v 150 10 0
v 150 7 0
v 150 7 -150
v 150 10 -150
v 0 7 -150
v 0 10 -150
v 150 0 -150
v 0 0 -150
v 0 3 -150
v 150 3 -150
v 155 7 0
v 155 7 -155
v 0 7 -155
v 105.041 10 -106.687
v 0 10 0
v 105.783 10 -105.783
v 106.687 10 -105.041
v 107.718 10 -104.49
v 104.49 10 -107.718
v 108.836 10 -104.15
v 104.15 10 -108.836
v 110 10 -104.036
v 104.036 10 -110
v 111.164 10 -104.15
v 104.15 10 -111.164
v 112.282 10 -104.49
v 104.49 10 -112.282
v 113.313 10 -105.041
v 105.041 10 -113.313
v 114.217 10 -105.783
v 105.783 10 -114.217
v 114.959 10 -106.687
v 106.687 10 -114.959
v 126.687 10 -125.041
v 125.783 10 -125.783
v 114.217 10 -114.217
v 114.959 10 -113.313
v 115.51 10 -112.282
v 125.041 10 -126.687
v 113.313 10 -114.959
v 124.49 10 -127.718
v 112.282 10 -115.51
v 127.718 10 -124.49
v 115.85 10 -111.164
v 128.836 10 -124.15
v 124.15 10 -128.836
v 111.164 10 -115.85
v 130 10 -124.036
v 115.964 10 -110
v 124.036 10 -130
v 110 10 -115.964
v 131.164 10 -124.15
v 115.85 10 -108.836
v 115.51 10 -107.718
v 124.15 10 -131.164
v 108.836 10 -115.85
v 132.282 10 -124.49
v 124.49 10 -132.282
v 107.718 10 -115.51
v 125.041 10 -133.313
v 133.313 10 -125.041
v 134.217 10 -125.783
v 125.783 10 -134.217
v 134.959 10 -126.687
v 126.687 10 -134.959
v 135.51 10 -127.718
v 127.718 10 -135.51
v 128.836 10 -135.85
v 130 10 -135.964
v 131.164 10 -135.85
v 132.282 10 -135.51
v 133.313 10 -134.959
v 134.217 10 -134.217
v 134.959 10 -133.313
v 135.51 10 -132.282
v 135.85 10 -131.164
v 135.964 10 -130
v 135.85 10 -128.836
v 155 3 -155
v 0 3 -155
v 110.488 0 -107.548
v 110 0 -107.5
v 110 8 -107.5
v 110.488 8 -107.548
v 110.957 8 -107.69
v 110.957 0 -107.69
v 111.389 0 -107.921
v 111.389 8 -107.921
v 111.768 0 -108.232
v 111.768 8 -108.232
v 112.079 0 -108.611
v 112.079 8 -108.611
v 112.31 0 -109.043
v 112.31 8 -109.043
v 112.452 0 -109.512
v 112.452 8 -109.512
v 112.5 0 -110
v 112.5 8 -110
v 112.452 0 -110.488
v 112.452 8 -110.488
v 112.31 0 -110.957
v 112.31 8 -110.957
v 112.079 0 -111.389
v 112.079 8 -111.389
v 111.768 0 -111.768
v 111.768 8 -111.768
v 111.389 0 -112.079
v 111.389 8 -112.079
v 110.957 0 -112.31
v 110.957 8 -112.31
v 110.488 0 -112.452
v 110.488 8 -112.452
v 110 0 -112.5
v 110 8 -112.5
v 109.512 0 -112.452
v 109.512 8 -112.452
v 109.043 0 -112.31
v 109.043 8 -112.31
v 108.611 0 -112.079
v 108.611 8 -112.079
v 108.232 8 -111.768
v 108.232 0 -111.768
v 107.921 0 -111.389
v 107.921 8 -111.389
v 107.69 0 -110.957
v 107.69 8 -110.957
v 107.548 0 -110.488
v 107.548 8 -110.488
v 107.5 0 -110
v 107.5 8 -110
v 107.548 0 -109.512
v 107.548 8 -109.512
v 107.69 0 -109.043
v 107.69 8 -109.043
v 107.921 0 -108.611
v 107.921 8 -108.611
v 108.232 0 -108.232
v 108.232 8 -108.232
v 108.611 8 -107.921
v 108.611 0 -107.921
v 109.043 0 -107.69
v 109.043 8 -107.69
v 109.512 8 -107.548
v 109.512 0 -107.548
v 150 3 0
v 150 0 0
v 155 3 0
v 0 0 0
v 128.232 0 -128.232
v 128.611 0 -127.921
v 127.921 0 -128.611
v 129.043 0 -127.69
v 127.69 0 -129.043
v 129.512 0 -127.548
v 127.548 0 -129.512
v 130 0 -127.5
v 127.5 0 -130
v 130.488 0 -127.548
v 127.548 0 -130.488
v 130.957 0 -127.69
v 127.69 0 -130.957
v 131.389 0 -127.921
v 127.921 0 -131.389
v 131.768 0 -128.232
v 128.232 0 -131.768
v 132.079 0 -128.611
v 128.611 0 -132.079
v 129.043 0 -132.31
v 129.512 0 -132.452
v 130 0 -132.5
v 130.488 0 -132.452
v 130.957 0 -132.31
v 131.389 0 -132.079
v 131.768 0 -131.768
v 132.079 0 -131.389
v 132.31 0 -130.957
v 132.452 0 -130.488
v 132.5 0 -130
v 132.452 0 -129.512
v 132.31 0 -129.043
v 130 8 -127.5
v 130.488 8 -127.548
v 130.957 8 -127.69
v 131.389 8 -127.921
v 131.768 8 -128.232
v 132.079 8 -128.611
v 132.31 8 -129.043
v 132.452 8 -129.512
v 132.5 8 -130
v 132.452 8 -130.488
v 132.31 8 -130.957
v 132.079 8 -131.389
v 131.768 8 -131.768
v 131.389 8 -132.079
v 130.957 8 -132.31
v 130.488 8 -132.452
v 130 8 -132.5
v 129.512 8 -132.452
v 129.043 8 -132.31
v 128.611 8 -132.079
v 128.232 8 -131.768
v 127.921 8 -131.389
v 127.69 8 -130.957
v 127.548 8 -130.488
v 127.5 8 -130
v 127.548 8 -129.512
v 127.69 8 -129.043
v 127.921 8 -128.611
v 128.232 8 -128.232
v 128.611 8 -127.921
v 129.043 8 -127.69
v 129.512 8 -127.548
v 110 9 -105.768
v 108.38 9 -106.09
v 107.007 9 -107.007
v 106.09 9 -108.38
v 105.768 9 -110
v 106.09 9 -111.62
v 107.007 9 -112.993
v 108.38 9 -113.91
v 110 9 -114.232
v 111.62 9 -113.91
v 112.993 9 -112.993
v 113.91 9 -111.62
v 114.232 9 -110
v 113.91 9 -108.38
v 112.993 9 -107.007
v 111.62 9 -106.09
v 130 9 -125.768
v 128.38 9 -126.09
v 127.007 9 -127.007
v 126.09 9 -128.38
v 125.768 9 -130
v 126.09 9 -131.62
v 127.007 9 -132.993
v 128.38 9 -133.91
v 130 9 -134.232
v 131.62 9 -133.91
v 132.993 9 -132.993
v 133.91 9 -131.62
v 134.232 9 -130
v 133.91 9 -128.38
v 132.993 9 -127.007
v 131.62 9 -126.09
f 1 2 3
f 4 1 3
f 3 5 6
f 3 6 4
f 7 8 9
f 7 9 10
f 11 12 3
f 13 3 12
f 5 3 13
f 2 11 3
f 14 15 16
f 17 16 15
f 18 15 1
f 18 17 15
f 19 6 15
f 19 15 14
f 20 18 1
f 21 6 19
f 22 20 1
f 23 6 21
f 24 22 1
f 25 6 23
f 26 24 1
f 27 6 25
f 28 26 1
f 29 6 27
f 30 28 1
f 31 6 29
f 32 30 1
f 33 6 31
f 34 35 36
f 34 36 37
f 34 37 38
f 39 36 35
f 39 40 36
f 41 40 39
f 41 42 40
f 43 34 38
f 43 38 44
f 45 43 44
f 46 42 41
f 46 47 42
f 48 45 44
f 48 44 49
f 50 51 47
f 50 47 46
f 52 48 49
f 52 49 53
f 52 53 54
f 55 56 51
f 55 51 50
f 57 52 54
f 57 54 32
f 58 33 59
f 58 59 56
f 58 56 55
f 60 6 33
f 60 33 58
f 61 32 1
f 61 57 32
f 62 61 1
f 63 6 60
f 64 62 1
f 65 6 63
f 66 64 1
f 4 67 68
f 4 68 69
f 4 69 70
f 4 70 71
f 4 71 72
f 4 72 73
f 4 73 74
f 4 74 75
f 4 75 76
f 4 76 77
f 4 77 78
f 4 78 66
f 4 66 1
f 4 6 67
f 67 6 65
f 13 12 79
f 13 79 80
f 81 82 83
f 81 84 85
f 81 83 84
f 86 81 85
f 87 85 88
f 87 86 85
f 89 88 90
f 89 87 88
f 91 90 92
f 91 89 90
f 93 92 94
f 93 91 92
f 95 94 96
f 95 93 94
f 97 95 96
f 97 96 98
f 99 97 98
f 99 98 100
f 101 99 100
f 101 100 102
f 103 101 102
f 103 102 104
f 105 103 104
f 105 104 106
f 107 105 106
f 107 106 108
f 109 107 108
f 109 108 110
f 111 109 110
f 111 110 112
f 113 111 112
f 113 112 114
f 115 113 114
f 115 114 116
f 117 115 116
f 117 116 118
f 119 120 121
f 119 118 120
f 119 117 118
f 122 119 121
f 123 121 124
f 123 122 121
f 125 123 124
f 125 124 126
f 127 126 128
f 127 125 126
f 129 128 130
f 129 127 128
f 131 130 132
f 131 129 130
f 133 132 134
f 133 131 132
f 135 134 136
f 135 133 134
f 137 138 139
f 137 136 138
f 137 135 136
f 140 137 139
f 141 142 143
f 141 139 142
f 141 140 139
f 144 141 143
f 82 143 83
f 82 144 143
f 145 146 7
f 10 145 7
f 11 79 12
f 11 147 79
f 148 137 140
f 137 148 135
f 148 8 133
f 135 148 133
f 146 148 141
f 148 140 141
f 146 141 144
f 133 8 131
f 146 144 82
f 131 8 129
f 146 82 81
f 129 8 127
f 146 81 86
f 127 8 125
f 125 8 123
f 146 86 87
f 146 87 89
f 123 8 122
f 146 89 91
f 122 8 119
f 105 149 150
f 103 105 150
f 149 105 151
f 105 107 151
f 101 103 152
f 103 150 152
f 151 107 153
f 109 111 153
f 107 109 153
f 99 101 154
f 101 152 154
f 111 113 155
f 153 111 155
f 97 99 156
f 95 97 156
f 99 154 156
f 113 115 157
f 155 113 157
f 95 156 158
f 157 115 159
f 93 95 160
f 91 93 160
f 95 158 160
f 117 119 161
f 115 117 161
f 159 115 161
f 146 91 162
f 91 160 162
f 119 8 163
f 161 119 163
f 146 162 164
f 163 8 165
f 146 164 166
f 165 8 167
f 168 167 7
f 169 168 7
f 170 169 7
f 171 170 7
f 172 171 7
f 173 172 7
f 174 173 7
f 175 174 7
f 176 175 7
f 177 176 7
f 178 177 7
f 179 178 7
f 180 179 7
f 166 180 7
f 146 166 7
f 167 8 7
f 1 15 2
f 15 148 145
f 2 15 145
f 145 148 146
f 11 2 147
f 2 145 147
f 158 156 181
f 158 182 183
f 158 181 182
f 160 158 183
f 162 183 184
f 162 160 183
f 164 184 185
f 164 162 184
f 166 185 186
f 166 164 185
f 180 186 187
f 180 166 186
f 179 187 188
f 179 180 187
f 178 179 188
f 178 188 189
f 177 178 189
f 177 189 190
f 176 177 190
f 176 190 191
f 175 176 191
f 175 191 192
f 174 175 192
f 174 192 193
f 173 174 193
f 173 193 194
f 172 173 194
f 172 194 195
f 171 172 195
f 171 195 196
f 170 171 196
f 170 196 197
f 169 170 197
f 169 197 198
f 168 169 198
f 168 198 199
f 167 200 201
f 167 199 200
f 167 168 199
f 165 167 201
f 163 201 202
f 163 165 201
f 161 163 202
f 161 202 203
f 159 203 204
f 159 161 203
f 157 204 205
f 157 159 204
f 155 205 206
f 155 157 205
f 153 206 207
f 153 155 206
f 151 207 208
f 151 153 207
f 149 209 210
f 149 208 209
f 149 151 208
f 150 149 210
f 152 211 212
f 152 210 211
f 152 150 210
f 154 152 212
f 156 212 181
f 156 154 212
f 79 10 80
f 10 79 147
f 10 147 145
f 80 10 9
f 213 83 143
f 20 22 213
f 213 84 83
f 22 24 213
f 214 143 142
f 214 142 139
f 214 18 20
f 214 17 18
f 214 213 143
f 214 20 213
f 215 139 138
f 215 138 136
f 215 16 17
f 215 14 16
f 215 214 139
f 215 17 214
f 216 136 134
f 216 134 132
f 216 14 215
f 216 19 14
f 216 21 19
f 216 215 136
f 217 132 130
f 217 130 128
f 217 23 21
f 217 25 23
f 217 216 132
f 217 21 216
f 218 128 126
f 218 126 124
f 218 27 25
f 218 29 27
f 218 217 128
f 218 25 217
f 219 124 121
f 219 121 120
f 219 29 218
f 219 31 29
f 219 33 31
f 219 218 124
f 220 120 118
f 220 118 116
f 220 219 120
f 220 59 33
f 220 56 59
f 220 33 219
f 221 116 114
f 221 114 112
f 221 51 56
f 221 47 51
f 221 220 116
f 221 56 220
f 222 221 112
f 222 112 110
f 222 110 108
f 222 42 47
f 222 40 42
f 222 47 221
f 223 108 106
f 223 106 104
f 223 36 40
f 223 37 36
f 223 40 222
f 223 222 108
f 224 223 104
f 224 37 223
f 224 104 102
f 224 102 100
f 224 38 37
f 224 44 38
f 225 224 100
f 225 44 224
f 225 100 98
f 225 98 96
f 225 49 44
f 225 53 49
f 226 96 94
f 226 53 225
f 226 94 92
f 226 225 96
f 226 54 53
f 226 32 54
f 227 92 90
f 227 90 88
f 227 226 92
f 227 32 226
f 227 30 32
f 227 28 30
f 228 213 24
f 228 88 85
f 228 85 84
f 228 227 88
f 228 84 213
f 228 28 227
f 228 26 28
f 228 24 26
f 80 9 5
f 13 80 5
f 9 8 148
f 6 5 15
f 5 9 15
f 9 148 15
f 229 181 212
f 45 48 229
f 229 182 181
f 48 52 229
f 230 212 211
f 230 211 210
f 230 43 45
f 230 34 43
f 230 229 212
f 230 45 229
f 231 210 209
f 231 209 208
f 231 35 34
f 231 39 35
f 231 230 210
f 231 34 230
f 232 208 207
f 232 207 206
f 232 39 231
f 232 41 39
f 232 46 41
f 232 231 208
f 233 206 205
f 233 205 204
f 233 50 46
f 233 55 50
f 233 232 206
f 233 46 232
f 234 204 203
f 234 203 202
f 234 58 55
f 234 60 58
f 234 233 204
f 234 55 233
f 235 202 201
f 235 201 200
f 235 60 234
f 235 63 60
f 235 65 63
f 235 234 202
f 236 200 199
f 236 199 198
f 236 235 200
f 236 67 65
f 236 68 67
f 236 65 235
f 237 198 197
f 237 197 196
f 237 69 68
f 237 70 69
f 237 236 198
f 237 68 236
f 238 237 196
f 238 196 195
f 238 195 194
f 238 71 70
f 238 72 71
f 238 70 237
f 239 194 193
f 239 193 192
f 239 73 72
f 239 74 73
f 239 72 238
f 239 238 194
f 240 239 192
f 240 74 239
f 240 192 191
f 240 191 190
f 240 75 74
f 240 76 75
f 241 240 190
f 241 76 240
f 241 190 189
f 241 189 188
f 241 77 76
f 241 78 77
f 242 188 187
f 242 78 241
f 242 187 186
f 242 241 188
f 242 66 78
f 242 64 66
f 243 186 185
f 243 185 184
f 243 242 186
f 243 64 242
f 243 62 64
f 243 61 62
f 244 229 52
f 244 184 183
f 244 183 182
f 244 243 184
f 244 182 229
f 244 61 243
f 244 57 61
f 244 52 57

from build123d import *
from OCP.BRepFilletAPI import BRepFilletAPI_MakeChamfer

# Parameters (mm, degrees)
SKETCH1_W               = 150
SKETCH1_H               = 150
BOSS_EXTRUDE1_DEPTH     = 10
SKETCH2_W               = 150
SKETCH2_H               = 4
BOSS_EXTRUDE2_DEPTH     = 5
SKETCH3_W               = 155
SKETCH3_H               = 4
BOSS_EXTRUDE3_DEPTH     = 5
CUT_EXTRUDE1_DEPTH      = 220.431082575
CUT_EXTRUDE1_DEPTH_BACK = 220.431082575
SKETCH4_R               = 2.5
CHAMFER1_SIZE           = 2
CHAMFER1_SIZE2          = 3.464101615


with BuildPart() as part:
    # Sketch1 → Boss-Extrude1 (new body)
    with BuildSketch(Plane(origin=(0, 0, 0), x_dir=(1, 0, 0), z_dir=(0, 1, 0))):
        with Locations((75, 75)):
            Rectangle(SKETCH1_W, SKETCH1_H)
    extrude(amount=BOSS_EXTRUDE1_DEPTH)

    # Sketch2 → Boss-Extrude2 (add)
    with BuildSketch(Plane(origin=(150, 0, 0), x_dir=(0, 0, -1), z_dir=(1, 0, 0))):
        with Locations((75, 5)):
            Rectangle(SKETCH2_W, SKETCH2_H)
    extrude(amount=BOSS_EXTRUDE2_DEPTH)

    # Sketch3 → Boss-Extrude3 (add)
    with BuildSketch(Plane(origin=(0, 0, -150), x_dir=(-1, 0, 0), z_dir=(0, 0, -1))):
        with Locations((-77.5, 5)):
            Rectangle(SKETCH3_W, SKETCH3_H)
    extrude(amount=BOSS_EXTRUDE3_DEPTH)

    # Sketch4 → Cut-Extrude1 (cut, two sides: drawn at the far end of the back side and taken through both)
    with BuildSketch(Plane(origin=(0, 10, 0), x_dir=(1, 0, 0), z_dir=(0, 1, 0)).offset(-CUT_EXTRUDE1_DEPTH_BACK)):
        with Locations(Location((130, 130, 0), (0, 0, 270))):
            Circle(SKETCH4_R)
        with Locations(Location((110, 110, 0), (0, 0, 270))):
            Circle(SKETCH4_R)
    extrude(amount=CUT_EXTRUDE1_DEPTH + CUT_EXTRUDE1_DEPTH_BACK, mode=Mode.SUBTRACT)

    # Chamfer1: one chamfer whose edges measure the first distance from different faces: ONE call of the kernel's chamfer builder (chamfer() names one face for all edges)
    chamfer1_edges_1 = [part.edges().sort_by_distance(p)[0] for p in [
        (130, 10, -132.5),
    ]]
    chamfer1_side_1 = [part.faces().sort_by_distance(p)[0] for p in [
        (130, 5, -132.5),
    ]]
    chamfer1_edges_2 = [part.edges().sort_by_distance(p)[0] for p in [
        (110, 10, -112.5),
    ]]
    chamfer1_side_2 = [part.faces().sort_by_distance(p)[0] for p in [
        (110, 5, -112.5),
    ]]
    chamfer1 = BRepFilletAPI_MakeChamfer(part.part.solid().wrapped)
    for e in chamfer1_edges_1:
        chamfer1.Add(CHAMFER1_SIZE, CHAMFER1_SIZE2, e.wrapped, chamfer1_side_1[0].wrapped)  # the first distance lies on this face
    for e in chamfer1_edges_2:
        chamfer1.Add(CHAMFER1_SIZE, CHAMFER1_SIZE2, e.wrapped, chamfer1_side_2[0].wrapped)  # the first distance lies on this face
    add(Compound.cast(chamfer1.Shape()), mode=Mode.REPLACE)


solid = part.part
